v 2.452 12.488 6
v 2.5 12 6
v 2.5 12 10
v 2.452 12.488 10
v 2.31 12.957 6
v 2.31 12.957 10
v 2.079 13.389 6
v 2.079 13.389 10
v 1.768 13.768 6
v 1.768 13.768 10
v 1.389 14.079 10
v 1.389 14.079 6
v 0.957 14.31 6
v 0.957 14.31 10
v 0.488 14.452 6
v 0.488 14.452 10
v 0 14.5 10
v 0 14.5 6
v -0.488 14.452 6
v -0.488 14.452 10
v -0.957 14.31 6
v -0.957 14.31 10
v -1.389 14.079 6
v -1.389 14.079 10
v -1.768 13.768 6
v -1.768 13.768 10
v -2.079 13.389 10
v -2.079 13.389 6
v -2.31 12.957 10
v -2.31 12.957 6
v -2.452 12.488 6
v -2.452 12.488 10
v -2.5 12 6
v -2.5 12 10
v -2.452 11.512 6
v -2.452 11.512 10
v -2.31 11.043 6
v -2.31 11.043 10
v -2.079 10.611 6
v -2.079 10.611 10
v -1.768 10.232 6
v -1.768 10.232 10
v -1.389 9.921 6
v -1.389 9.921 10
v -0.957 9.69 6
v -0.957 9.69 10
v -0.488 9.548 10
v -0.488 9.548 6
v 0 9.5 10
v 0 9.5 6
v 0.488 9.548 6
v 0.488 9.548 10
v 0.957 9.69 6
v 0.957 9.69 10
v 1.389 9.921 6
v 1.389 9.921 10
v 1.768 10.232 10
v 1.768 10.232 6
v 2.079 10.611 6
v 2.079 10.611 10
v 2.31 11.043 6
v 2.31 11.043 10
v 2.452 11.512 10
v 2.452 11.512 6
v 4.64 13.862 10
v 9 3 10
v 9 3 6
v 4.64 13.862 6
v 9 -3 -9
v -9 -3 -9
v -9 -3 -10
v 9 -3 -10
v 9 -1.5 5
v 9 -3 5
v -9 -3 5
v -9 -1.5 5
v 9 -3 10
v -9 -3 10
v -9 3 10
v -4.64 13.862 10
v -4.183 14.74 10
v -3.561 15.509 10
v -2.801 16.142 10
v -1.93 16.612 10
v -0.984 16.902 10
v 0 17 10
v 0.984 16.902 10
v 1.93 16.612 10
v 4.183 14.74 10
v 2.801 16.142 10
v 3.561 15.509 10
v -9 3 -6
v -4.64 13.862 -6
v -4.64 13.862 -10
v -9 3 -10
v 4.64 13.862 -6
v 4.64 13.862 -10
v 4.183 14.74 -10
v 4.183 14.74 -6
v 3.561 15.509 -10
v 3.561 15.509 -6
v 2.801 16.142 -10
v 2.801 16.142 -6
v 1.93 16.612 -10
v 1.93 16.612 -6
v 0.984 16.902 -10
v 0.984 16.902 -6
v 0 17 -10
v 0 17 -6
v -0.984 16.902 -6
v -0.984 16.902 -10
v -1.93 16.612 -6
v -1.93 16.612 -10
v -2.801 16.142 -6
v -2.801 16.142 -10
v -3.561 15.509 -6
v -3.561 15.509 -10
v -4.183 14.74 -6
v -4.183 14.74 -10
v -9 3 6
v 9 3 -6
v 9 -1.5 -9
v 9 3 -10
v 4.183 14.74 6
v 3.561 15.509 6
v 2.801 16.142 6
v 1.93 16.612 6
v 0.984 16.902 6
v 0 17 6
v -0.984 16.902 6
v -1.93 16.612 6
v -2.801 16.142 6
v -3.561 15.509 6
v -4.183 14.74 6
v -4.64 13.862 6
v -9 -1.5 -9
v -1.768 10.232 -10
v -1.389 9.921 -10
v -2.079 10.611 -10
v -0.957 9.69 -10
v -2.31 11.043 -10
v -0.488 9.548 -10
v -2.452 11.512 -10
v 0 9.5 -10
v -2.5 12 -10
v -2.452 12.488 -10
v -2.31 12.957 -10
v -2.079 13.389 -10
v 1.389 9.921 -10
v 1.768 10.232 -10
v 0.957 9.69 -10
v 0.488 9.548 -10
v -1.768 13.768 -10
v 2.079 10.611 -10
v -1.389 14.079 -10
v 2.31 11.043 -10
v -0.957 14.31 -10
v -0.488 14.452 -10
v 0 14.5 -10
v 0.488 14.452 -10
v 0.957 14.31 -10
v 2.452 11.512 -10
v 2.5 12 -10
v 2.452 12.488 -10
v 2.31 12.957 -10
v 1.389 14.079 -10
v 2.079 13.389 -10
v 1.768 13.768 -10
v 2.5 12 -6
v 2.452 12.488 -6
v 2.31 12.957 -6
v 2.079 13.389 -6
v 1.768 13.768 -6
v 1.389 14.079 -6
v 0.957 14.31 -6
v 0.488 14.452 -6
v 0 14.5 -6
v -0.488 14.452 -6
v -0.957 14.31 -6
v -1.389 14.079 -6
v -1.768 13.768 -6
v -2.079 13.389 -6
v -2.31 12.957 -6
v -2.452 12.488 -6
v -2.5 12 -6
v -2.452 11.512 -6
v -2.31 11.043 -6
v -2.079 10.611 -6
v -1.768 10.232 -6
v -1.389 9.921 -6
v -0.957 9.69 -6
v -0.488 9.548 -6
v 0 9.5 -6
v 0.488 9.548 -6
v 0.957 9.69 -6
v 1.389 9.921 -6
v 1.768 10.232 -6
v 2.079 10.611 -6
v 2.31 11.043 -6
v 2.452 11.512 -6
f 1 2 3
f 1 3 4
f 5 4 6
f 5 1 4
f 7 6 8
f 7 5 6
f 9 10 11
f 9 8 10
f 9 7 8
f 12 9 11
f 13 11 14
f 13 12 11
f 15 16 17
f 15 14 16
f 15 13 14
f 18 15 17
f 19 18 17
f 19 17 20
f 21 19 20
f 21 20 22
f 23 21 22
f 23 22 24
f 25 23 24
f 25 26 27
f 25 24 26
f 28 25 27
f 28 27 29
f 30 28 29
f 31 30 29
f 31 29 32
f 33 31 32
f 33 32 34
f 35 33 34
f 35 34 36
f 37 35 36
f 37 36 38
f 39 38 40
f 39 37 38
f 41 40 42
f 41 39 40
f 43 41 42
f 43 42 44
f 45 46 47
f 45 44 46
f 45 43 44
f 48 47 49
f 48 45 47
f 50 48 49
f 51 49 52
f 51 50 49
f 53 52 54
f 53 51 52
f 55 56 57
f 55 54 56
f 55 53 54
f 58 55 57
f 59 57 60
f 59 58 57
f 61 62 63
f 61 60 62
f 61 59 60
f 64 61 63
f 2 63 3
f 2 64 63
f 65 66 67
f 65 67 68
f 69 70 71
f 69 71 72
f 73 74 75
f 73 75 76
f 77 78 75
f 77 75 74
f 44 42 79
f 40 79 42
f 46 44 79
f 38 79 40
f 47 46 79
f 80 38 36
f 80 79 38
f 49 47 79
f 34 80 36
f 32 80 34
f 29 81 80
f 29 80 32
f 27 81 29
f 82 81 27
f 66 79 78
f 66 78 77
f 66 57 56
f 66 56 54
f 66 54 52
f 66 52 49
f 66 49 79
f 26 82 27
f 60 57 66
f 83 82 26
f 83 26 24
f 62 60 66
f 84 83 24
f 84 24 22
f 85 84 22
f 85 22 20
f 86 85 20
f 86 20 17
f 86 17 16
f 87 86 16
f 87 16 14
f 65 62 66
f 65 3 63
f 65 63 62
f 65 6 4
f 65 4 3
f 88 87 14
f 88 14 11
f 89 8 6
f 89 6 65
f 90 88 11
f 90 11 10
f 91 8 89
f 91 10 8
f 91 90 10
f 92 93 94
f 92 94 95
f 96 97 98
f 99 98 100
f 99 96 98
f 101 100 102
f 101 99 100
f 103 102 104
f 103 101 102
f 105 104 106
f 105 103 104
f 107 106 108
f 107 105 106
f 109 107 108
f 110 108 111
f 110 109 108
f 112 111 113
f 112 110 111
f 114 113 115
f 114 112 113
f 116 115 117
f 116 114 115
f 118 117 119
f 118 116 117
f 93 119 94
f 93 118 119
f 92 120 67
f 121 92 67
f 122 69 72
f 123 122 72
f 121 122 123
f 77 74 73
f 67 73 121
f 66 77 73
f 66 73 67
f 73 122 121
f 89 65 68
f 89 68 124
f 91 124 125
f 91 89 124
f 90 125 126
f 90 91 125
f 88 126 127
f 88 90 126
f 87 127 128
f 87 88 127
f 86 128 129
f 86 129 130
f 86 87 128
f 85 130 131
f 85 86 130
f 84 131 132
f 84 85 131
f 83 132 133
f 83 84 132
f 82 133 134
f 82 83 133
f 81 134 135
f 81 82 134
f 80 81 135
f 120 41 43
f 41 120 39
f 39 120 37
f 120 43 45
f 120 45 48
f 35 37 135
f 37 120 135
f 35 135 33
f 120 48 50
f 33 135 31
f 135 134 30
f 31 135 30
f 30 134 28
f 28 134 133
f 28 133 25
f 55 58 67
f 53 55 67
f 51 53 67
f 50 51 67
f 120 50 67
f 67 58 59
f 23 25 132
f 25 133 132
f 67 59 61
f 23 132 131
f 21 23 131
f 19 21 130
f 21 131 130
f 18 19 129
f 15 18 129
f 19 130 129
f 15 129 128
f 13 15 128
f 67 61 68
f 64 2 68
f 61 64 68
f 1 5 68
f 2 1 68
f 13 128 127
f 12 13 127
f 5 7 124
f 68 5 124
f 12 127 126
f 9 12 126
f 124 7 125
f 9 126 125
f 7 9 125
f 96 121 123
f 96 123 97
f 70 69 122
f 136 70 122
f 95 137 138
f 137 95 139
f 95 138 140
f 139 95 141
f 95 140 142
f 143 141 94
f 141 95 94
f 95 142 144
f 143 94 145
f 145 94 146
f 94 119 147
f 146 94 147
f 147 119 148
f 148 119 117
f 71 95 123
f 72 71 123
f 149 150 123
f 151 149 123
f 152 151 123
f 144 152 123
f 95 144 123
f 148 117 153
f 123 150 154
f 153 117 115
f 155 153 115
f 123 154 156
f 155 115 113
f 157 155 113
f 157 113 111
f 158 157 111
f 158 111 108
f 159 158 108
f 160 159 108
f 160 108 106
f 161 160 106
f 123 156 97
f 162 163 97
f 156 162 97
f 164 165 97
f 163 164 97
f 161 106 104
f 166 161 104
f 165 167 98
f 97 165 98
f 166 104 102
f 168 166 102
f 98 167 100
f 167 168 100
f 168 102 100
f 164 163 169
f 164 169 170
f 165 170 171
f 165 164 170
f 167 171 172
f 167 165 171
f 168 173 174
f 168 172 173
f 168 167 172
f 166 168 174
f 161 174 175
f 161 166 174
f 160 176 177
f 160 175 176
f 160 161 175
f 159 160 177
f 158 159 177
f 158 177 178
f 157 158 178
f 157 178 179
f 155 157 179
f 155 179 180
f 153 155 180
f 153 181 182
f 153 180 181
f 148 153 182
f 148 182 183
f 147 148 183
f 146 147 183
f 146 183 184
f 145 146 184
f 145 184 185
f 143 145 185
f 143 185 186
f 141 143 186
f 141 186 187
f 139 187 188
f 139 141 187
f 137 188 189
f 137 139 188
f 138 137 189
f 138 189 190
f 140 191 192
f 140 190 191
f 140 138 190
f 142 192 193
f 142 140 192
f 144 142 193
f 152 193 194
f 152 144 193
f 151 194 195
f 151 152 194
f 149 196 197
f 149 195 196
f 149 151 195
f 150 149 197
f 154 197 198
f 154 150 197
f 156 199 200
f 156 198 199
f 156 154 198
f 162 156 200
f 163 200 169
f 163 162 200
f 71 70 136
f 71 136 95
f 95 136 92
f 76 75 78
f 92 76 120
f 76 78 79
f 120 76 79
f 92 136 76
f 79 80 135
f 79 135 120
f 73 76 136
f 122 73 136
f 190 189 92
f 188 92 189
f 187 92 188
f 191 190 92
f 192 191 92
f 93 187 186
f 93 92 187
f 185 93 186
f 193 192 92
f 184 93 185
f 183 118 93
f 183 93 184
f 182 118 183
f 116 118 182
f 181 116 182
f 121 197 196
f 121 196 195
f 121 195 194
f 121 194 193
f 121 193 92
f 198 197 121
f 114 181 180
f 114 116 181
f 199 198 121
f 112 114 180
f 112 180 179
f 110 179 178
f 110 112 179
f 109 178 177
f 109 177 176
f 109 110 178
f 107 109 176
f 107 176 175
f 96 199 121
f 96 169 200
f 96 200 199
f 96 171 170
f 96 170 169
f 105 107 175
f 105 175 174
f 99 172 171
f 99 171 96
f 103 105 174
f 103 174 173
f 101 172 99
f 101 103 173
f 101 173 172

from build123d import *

# Parameters (mm, degrees)
SKETCH_1_R               = 5
SKETCH_1_W               = 18
SKETCH_1_H               = 6
EXTRUDE_1_DEPTH          = 10
CUT_EXTRUDE_1_DEPTH      = 27.702059846
CUT_EXTRUDE_1_DEPTH_BACK = 27.702059846
SKETCH_2_W               = 14
SKETCH_2_H               = 3
CUT_EXTRUDE_START        = -4
CUT_EXTRUDE_2_DEPTH      = 12
CUT_EXTRUDE_3_DEPTH      = 28.748873851
CUT_EXTRUDE_3_DEPTH_BACK = 28.748873851
SKETCH_4_R               = 2.5


with BuildPart() as part:
    # 草图1 → 凸台-拉伸1 (new, symmetric)
    with BuildSketch(Plane.XY):
        with Locations((0, 12)):
            Circle(SKETCH_1_R)
        with BuildLine():
            Line((9, 3), (4.64019442, 13.862416642))
            ThreePointArc((4.64019442, 13.862416642), (4.909224587, 12.948427093), (5, 12))
            ThreePointArc((5, 12), (-0.948427093, 7.090775413), (-4.64019442, 13.862416642))
            Line((-4.64019442, 13.862416642), (-9, 3))
            Line((-9, 3), (9, 3))
        make_face()
        Rectangle(SKETCH_1_W, SKETCH_1_H)
    extrude(amount=EXTRUDE_1_DEPTH, both=True)

    # 草图2 → 切除-拉伸1 (cut, two sides: drawn at the far end of the back side and taken through both)
    with BuildSketch(Plane(origin=(9, 0, 0), x_dir=(0, 0, -1), z_dir=(1, 0, 0)).offset(-CUT_EXTRUDE_1_DEPTH_BACK)):
        with Locations((2, -3)):
            Rectangle(SKETCH_2_W, SKETCH_2_H)
    extrude(amount=CUT_EXTRUDE_1_DEPTH + CUT_EXTRUDE_1_DEPTH_BACK, mode=Mode.SUBTRACT)

    # 草图3 → 切除-拉伸2 (cut)
    with BuildSketch(Plane.XY.offset(10).offset(CUT_EXTRUDE_START)):
        with BuildLine():
            Line((-9, 3), (9, 3))
            Line((9, 3), (4.64019442, 13.862416642))
            ThreePointArc((4.64019442, 13.862416642), (0, 17), (-4.64019442, 13.862416642))
            Line((-4.64019442, 13.862416642), (-9, 3))
        make_face()
    extrude(amount=-CUT_EXTRUDE_2_DEPTH, mode=Mode.SUBTRACT)

    # 草图4 → 切除-拉伸3 (cut, two sides: drawn at the far end of the back side and taken through both)
    with BuildSketch(Plane.XY.offset(10).offset(-CUT_EXTRUDE_3_DEPTH_BACK)):
        with Locations((0, 12)):
            Circle(SKETCH_4_R)
    extrude(amount=CUT_EXTRUDE_3_DEPTH + CUT_EXTRUDE_3_DEPTH_BACK, mode=Mode.SUBTRACT)


solid = part.part
